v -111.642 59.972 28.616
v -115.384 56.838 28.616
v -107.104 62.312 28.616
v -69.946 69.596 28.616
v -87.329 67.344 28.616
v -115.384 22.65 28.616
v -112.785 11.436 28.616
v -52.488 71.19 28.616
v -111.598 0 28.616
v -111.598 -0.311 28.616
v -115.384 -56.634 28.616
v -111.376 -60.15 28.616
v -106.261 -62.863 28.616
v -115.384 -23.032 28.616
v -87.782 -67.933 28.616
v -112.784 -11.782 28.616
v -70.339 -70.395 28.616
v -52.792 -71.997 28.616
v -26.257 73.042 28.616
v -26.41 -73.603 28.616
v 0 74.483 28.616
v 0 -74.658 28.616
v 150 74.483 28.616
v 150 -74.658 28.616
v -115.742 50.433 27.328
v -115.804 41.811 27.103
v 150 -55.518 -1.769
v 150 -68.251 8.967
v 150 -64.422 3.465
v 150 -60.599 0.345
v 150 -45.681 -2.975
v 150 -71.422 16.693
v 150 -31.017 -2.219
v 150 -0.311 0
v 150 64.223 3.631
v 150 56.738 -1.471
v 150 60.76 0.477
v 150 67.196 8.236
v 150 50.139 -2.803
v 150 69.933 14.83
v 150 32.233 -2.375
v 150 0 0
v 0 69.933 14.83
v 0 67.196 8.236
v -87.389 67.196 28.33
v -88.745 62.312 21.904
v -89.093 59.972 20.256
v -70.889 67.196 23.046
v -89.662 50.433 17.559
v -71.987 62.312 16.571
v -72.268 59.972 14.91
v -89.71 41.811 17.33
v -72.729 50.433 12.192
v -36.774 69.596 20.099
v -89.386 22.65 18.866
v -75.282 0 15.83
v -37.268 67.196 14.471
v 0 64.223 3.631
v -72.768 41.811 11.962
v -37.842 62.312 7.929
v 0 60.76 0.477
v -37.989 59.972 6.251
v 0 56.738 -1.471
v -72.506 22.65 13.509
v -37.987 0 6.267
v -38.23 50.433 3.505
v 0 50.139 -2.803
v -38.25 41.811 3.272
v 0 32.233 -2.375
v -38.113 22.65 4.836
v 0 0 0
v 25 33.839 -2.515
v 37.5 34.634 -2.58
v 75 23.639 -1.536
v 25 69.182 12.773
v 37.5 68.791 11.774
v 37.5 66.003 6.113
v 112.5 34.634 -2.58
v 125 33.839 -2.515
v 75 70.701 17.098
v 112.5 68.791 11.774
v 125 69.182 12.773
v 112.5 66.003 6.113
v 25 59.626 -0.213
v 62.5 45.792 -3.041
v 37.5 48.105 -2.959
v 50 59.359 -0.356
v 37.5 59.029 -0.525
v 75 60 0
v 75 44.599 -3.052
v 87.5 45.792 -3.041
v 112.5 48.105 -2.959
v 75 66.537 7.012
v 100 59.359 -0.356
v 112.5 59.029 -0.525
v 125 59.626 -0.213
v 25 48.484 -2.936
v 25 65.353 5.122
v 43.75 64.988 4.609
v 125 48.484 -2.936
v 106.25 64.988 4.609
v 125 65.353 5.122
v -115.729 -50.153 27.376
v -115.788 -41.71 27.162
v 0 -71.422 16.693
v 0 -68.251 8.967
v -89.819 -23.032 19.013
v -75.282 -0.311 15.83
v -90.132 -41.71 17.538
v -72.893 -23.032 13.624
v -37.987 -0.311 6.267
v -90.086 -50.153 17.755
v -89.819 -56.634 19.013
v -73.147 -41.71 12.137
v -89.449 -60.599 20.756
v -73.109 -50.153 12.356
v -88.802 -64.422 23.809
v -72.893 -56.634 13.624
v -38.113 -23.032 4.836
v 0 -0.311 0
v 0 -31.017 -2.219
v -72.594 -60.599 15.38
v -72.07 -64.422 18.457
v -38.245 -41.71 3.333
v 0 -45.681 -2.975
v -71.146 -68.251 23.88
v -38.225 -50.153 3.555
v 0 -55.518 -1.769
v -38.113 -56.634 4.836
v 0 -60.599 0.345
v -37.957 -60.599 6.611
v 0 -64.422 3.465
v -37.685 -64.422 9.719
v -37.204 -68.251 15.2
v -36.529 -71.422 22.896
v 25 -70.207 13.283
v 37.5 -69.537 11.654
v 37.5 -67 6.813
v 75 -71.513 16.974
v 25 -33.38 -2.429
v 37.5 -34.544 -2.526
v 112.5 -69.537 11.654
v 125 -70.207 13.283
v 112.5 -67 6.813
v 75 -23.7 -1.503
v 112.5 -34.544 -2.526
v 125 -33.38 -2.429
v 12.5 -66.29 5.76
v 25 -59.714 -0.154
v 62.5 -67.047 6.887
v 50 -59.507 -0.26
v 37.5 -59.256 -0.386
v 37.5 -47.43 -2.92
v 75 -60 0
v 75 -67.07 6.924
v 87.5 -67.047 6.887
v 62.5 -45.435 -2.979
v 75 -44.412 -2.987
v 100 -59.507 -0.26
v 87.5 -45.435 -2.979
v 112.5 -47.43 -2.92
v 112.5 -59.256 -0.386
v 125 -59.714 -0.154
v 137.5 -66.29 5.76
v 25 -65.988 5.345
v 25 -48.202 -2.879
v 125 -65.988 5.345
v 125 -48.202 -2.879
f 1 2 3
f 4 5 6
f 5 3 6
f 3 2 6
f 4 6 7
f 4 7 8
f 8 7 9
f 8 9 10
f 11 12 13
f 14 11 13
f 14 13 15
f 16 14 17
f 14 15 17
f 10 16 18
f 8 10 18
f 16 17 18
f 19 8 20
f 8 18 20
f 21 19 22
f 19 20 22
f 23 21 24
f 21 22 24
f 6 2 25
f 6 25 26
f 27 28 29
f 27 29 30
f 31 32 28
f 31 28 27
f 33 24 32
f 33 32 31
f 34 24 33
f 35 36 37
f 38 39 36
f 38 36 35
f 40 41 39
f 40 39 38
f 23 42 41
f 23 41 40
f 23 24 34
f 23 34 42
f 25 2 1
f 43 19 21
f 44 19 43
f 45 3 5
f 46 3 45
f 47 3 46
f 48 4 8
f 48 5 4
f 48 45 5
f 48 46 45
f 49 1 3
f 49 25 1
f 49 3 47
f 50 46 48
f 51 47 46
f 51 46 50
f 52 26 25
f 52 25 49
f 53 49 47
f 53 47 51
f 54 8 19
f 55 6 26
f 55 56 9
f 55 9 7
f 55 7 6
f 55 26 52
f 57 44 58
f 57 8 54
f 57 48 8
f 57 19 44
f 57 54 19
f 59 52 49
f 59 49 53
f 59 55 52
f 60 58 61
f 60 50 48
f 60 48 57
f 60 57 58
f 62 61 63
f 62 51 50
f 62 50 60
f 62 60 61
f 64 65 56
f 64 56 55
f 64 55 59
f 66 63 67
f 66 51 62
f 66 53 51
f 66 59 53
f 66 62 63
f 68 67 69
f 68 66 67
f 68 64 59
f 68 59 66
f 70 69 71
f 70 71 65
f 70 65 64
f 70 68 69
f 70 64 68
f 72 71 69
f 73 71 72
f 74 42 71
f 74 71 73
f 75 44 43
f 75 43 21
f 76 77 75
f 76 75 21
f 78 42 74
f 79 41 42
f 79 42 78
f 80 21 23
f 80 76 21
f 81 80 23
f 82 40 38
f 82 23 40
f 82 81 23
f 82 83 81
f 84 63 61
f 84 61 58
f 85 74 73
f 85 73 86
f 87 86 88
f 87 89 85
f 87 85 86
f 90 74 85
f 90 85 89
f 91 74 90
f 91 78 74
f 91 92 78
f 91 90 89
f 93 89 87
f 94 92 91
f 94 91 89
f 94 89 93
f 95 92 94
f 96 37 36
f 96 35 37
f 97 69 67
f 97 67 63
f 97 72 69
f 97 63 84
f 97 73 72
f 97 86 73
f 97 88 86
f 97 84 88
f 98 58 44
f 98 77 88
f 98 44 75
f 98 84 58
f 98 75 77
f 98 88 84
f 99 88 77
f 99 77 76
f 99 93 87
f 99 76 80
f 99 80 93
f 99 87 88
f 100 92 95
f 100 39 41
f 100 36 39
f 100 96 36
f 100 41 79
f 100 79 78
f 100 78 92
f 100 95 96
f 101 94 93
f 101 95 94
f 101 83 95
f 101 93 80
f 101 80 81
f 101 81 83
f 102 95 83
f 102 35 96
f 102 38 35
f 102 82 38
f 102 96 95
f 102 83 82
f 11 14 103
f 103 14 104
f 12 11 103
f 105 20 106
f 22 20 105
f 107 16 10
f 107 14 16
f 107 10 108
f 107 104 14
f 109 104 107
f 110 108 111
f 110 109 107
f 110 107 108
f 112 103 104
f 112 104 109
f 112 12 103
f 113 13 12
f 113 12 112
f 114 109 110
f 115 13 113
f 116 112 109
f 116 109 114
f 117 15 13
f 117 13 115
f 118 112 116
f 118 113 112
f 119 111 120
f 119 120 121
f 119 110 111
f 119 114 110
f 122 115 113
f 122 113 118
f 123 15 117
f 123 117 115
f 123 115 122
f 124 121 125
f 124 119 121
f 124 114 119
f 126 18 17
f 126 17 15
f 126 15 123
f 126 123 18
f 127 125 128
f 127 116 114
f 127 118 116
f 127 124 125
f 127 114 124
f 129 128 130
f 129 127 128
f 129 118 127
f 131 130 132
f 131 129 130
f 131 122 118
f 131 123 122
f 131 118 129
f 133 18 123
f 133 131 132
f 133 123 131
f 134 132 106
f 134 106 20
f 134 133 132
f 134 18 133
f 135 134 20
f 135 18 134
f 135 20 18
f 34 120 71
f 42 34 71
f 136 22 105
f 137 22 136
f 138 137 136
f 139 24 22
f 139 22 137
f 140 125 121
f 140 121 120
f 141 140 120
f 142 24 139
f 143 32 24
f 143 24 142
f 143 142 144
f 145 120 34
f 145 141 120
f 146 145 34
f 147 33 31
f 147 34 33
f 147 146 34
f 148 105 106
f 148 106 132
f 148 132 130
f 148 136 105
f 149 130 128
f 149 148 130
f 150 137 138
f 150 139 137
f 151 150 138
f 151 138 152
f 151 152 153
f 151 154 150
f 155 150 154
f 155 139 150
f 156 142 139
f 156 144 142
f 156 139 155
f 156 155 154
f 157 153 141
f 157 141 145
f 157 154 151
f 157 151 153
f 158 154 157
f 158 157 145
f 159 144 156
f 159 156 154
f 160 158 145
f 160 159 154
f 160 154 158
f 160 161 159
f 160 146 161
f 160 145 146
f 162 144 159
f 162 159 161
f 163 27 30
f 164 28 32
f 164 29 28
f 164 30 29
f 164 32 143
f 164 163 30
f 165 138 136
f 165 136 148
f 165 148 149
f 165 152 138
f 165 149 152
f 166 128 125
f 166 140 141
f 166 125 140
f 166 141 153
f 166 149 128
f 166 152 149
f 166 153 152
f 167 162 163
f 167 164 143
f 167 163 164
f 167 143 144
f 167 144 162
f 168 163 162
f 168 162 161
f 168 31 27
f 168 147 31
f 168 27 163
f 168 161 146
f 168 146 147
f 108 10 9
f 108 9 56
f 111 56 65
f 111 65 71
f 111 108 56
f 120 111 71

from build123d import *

# Parameters (mm, degrees)
F3_DEPTH = 150
F5_W     = 287.4648571014
F5_H     = 39.5074803382
F6_DEPTH = 100


with BuildPart() as f3:
    # F2 (on offset) → F3 (new body)
    with BuildSketch(Plane.YZ.offset(150)):
        with BuildLine():
            Line((75, 30), (-75, 30))
            add(Edge.make_bspline(
                [(-75, 30), (-71.9329359938, 17.6180406035), (-65.4869883967, -11.7202689141), (-24.2230739874, -0.0289004303), (-0.310510428, 0)],
                knots=[0, 0, 0, 0, 0.2139055177, 0.4987670748, 0.4987670748, 0.4987670748, 0.4987670748], degree=3))
            Line((-0.310510428, 0), (0, 0))
            add(Edge.make_bspline(
                [(0, 0), (24.0188569043, -0.0291511428), (66.5209416521, -11.9529873249), (70.3629883157, 17.8901810125), (75, 30)],
                knots=[0.5, 0.5, 0.5, 0.5, 0.7860944823, 1, 1, 1, 1], degree=3))
        make_face()
    extrude(amount=-F3_DEPTH)

    # F4: sweep along a path in F0
    with BuildLine(Plane.XZ) as f4_path:
        ThreePointArc((-115, 30), (-58.5173093171, 11.1003142846), (0, 0))
    # F3_face (on face) → F4 (sweep)
    with BuildSketch(Plane(origin=(0, -0.2555367718, 14.7206073646), x_dir=(0, 1, 0), z_dir=(-1, 0, 0))):
        with BuildLine():
            add(Edge.make_bspline(
                [(0.2555367718, 14.7206073646), (24.274393676, 14.7497585074), (66.7764784238, 26.6735946895), (70.6185250874, -3.1695736479), (75.2555367718, -15.2793926354)],
                knots=[0.5, 0.5, 0.5, 0.5, 0.7860944823, 1, 1, 1, 1], degree=3))
            Line((0.2555367718, 14.7206073646), (-0.0549736563, 14.7206073646))
            add(Edge.make_bspline(
                [(-74.7444632282, -15.2793926354), (-71.677399222, -2.8974332389), (-65.231451625, 26.4408762787), (-23.9675372157, 14.7495077949), (-0.0549736563, 14.7206073646)],
                knots=[0, 0, 0, 0, 0.2139055177, 0.4987670748, 0.4987670748, 0.4987670748, 0.4987670748], degree=3))
            Line((-74.7444632282, -15.2793926354), (75.2555367718, -15.2793926354))
        make_face()
    sweep(path=f4_path.line)

    # F5 (on Front) → F6 (cut, symmetric)
    with BuildSketch(Plane.XZ):
        with Locations((11.0934823751, 48.3694141731)):
            Rectangle(F5_W, F5_H)
    extrude(amount=F6_DEPTH, both=True, mode=Mode.SUBTRACT)


solid = f3.part
